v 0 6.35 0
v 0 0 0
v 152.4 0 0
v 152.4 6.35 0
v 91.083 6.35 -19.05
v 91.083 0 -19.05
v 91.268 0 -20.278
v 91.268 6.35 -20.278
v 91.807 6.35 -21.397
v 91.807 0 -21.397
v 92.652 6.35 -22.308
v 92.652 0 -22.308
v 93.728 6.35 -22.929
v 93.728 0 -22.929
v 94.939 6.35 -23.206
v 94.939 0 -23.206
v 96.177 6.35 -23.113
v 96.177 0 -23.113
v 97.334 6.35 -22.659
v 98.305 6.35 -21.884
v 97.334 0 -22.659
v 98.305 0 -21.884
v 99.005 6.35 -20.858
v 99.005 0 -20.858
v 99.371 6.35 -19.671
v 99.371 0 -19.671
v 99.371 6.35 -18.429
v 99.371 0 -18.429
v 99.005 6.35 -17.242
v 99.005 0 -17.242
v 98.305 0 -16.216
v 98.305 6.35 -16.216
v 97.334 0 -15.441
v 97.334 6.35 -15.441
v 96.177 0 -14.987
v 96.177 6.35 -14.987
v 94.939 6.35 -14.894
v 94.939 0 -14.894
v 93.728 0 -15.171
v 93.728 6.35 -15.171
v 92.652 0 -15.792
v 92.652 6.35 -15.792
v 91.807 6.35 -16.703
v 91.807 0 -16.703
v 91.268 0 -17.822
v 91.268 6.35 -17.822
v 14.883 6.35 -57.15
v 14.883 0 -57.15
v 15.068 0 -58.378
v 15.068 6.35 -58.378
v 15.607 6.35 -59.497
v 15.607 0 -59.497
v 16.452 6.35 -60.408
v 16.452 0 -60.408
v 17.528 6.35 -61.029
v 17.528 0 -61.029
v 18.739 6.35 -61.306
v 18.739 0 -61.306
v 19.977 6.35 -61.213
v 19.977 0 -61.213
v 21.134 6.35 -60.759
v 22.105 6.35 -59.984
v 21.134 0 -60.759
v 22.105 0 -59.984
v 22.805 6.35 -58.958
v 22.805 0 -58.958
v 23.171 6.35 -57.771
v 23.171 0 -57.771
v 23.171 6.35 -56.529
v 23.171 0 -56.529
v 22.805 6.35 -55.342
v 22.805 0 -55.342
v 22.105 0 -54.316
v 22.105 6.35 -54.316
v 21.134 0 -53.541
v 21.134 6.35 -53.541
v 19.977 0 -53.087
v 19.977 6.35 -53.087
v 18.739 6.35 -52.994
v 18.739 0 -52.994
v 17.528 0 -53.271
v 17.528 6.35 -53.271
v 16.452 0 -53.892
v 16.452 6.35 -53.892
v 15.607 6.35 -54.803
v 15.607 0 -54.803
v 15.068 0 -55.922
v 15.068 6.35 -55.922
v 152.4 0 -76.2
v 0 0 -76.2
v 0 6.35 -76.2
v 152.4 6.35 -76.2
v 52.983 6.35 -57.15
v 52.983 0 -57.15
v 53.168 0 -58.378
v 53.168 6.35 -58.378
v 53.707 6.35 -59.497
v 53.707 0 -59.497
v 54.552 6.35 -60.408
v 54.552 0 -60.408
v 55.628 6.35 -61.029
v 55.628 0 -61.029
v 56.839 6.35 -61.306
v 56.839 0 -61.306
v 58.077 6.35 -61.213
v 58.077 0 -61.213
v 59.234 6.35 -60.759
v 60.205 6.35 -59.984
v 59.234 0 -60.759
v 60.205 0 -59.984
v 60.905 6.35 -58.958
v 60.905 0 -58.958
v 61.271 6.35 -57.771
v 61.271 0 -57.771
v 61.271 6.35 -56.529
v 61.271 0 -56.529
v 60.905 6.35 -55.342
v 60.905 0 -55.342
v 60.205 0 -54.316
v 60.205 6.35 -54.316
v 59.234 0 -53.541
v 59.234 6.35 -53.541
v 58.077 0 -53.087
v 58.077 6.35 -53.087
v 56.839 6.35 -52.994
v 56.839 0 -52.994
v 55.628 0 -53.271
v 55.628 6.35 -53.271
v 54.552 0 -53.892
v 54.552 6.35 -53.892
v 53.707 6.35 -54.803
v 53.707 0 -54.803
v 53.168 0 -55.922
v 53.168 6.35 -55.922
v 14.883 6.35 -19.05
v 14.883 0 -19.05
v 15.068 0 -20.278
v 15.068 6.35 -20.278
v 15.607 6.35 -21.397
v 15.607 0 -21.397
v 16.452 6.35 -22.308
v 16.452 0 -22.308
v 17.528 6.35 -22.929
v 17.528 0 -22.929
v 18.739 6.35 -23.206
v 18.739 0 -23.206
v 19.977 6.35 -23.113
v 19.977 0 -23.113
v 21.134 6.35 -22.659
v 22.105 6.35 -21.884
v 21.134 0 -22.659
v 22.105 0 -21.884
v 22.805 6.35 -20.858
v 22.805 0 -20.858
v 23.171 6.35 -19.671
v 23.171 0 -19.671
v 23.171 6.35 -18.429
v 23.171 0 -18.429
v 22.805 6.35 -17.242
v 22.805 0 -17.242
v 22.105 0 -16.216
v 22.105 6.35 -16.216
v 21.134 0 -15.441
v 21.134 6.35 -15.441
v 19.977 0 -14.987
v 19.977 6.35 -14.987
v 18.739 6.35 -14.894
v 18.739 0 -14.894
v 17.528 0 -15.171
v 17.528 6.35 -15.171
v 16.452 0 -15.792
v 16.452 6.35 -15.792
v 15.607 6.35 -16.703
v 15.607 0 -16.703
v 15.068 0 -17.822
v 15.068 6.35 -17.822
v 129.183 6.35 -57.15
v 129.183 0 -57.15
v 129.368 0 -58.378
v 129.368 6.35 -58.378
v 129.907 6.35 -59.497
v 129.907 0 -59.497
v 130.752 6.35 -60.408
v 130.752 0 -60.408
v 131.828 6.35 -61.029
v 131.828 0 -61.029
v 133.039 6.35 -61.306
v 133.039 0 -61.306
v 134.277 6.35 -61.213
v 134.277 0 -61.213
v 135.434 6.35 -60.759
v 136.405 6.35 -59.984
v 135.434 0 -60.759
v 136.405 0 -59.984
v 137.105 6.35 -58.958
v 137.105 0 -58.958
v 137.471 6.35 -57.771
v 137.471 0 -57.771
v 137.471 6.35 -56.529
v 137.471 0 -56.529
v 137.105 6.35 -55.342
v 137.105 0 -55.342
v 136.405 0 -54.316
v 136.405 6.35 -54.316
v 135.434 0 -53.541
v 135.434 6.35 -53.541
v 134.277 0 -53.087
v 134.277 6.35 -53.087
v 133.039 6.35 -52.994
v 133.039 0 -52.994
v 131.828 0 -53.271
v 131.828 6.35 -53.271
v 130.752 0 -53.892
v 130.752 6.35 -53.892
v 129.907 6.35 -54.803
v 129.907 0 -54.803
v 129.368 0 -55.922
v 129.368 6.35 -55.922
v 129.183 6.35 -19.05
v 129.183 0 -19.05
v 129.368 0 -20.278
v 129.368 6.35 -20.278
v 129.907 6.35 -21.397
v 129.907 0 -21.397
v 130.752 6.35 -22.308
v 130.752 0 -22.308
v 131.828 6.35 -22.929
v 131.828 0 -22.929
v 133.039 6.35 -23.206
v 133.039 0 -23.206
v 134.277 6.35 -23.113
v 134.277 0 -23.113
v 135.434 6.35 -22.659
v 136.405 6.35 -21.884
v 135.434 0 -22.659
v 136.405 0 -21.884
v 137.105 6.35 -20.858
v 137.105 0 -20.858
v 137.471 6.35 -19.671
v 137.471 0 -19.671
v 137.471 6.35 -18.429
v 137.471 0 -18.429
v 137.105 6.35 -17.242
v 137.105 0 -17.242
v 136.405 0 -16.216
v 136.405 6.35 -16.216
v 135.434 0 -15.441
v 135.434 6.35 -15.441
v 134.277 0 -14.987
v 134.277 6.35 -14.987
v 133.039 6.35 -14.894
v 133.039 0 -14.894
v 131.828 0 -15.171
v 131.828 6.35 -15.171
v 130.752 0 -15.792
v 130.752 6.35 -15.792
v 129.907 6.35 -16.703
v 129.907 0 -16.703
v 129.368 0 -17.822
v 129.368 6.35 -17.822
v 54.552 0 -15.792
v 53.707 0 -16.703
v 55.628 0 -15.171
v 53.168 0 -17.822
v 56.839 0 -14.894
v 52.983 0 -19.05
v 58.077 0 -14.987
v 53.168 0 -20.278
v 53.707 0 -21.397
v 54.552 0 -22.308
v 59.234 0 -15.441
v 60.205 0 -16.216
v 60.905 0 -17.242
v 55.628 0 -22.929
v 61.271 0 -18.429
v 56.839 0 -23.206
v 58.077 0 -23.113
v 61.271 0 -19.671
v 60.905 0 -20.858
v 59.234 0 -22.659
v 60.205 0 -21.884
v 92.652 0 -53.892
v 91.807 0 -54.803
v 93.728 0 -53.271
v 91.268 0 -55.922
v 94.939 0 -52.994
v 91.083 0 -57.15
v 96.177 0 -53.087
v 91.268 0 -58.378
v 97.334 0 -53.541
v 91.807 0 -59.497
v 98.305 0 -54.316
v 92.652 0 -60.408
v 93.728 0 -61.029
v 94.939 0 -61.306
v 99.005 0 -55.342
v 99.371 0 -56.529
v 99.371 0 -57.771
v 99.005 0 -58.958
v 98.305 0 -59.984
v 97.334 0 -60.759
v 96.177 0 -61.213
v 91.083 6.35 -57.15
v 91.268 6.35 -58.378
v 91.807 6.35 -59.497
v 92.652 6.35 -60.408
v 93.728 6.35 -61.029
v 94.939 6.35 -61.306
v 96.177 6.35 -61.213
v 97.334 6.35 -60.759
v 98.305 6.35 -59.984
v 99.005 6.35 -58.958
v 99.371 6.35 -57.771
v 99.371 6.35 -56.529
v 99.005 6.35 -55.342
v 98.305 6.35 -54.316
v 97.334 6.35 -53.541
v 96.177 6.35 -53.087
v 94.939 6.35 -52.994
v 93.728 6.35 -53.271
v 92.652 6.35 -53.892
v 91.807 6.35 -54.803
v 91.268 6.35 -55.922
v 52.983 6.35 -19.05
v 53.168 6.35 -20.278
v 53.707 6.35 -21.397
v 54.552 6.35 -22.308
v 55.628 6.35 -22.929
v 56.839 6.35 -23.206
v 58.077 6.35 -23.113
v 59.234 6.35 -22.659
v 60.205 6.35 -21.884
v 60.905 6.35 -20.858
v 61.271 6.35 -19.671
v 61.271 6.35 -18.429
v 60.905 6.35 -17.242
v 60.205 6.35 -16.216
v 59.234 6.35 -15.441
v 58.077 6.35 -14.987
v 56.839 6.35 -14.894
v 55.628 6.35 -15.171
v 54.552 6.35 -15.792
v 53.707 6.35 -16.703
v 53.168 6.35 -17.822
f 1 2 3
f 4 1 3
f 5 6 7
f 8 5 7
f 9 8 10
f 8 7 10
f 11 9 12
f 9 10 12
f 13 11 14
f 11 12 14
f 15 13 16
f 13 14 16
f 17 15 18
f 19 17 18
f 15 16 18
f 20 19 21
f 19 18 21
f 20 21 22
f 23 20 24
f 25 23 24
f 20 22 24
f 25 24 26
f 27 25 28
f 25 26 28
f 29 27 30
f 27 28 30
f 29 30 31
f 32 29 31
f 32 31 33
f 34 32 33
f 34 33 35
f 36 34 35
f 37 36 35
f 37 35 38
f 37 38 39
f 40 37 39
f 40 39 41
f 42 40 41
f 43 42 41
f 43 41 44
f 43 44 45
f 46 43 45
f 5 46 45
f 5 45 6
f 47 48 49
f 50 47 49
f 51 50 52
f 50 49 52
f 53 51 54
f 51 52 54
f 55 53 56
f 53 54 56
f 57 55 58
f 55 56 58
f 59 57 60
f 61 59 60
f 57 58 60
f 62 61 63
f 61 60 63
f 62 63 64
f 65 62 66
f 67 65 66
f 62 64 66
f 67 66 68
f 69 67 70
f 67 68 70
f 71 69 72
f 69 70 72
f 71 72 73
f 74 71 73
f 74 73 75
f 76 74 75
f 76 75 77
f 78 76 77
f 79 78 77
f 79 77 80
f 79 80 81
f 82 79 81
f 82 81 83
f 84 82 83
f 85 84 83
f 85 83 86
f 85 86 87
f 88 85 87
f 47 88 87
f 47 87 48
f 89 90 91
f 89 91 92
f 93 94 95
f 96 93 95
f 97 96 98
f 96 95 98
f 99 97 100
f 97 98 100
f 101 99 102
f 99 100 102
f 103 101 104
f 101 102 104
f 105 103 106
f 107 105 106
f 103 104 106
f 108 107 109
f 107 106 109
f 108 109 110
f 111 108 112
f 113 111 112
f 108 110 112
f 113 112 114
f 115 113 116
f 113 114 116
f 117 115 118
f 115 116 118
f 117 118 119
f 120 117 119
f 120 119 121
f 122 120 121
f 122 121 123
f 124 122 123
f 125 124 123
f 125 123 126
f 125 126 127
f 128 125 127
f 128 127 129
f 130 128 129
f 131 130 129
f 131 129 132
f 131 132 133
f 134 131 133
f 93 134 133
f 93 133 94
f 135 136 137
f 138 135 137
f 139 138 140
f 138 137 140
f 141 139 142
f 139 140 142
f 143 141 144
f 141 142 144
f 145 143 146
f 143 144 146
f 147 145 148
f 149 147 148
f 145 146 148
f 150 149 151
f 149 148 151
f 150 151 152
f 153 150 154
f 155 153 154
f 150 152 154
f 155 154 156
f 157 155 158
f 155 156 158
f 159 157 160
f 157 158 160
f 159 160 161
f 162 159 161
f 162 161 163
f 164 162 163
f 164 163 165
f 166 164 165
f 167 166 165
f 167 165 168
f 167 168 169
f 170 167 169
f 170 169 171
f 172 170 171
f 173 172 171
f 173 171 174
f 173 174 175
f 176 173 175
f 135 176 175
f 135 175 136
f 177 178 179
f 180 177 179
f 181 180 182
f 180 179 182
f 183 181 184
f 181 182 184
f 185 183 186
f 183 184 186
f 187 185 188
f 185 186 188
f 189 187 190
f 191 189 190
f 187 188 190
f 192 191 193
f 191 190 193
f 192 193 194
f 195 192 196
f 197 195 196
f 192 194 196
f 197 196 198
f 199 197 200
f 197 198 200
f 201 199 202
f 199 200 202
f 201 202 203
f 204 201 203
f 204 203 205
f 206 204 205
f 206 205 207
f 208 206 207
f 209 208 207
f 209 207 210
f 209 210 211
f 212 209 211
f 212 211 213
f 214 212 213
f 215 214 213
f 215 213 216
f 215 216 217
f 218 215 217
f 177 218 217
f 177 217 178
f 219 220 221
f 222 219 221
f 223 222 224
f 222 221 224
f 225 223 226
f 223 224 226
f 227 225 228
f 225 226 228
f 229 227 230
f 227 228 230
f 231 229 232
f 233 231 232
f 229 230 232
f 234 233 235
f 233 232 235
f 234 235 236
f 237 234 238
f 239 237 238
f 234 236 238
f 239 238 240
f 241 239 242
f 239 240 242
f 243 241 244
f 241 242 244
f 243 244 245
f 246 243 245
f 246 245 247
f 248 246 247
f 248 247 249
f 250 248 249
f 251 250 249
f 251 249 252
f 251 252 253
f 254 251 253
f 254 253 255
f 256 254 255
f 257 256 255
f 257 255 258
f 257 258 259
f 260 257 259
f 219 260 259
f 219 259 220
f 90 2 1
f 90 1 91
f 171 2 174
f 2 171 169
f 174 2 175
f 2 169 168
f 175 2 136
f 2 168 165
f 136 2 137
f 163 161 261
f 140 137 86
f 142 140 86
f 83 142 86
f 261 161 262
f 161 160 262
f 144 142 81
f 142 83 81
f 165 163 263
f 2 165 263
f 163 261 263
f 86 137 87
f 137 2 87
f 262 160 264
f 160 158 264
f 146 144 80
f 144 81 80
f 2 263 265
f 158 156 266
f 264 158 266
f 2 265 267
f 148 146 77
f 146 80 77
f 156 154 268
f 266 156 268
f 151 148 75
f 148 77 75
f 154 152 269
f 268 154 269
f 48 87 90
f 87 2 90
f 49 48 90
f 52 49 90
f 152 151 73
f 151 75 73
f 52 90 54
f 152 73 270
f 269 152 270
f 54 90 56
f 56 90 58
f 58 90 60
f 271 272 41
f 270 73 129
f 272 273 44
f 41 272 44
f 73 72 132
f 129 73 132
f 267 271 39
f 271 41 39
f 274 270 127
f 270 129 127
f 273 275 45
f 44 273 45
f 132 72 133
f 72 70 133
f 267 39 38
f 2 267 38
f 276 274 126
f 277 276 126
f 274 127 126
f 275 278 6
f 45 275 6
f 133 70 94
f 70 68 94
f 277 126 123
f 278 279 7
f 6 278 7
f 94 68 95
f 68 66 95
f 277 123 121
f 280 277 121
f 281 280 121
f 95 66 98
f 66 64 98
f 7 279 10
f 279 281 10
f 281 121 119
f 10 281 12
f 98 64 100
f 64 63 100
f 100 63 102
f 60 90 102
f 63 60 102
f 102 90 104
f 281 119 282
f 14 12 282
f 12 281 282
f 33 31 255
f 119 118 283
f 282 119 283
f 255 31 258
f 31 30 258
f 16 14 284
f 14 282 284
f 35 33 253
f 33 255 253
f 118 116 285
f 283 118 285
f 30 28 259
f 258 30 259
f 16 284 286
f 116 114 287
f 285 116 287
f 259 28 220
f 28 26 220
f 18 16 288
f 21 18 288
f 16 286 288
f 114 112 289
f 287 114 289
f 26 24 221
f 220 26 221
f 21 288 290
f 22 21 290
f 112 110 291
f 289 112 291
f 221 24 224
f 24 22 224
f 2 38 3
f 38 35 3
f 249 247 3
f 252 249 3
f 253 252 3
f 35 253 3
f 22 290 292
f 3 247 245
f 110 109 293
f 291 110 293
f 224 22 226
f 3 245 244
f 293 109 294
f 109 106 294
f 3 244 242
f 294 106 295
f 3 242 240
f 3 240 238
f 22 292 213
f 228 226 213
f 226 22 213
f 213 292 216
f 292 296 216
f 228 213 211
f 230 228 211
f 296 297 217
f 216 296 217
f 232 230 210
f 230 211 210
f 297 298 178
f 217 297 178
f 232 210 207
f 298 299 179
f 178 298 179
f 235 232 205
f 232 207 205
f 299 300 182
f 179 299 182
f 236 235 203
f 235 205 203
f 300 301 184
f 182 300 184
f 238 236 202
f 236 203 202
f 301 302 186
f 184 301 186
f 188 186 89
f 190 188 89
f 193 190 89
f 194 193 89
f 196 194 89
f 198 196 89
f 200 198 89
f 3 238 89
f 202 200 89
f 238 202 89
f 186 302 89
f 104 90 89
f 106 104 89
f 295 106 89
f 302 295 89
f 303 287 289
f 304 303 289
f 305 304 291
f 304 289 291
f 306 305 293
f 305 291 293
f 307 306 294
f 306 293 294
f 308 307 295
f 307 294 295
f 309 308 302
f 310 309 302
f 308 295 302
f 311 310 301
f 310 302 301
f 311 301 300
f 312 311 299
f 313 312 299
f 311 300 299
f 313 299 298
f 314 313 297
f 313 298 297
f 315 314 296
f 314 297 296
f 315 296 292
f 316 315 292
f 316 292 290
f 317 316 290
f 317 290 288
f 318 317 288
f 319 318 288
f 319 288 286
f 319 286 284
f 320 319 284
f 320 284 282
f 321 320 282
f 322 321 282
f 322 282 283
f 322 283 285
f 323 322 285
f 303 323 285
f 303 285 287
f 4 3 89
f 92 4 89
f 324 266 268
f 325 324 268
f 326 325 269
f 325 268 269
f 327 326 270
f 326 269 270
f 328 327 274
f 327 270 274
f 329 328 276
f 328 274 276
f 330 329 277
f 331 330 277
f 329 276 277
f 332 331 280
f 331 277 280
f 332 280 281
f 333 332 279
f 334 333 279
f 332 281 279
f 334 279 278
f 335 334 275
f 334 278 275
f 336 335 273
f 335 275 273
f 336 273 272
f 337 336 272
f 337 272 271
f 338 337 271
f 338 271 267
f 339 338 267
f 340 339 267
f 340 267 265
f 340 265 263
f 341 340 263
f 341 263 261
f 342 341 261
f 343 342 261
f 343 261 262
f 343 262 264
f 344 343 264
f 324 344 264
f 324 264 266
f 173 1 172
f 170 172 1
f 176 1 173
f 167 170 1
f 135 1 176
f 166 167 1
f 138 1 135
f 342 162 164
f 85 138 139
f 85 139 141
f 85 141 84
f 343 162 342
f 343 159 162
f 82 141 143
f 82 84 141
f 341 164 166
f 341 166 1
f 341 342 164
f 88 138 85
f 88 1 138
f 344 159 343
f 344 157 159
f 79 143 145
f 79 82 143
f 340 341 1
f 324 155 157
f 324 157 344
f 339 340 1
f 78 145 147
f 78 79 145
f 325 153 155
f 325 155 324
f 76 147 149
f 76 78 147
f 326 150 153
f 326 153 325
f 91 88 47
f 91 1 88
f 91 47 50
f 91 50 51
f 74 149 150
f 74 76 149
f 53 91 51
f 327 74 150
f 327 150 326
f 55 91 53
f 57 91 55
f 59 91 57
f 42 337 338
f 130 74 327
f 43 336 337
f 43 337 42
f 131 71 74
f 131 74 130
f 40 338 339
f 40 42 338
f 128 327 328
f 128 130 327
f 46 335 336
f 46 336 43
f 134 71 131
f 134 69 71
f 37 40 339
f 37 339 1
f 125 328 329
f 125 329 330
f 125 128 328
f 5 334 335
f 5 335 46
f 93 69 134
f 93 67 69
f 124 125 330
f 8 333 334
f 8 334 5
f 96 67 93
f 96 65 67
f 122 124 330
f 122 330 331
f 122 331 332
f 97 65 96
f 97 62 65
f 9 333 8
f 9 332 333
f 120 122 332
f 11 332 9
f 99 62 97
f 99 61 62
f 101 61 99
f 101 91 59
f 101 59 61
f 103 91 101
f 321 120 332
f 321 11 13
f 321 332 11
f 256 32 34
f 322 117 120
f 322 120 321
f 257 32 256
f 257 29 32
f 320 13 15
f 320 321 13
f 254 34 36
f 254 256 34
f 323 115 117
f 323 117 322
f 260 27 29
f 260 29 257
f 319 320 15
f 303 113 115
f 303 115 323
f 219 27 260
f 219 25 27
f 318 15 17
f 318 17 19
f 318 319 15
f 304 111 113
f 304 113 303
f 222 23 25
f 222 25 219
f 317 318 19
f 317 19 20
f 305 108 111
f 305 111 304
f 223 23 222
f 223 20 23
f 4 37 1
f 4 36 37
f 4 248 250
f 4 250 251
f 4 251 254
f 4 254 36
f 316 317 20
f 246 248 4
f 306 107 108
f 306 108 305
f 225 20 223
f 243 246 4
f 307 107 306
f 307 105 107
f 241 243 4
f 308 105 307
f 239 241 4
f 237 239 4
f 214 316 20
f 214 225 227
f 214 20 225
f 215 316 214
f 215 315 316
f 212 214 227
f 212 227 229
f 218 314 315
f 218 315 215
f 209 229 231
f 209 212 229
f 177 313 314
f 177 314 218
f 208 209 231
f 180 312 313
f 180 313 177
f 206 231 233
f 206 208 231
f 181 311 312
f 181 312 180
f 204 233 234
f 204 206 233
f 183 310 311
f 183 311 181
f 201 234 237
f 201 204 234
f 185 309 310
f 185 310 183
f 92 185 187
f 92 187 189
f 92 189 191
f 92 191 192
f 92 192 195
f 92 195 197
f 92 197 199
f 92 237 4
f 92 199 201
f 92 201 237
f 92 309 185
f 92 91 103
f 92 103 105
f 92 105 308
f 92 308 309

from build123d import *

# Parameters (mm, degrees)
SKETCH1_W                        = 152.4
SKETCH1_H                        = 76.2
BOSS_EXTRUDE1_DEPTH              = 6.35
F_21_64_0_32813_DIAMETER_HOLE1_D = 8.334502
LPATTERN1_COUNT                  = 2
LPATTERN1_PITCH                  = 38.1
LPATTERN1_COUNT_DIR2             = 4
LPATTERN1_PITCH_DIR2             = 38.1


with BuildPart() as part:
    # Sketch1 → Boss-Extrude1 (new body)
    with BuildSketch(Plane(origin=(0, 0, 0), x_dir=(1, 0, 0), z_dir=(0, 1, 0))):
        with Locations((76.2, 38.1)):
            Rectangle(SKETCH1_W, SKETCH1_H)
    extrude(amount=BOSS_EXTRUDE1_DEPTH)

    # 21/64 (0.32813) Diameter Hole1 (through all)
    with Locations(Plane(origin=(0, 6.35, 0), x_dir=(1, 0, 0), z_dir=(0, 1, 0))):
        with Locations((19.05, 57.15)):
            f_21_64_0_32813_diameter_hole1 = Hole(F_21_64_0_32813_DIAMETER_HOLE1_D / 2)

    # LPattern1: 21_64 _0.32813_ Diameter Hole1 2 × 4
    with Locations(*[(j * LPATTERN1_PITCH_DIR2, 0, i * LPATTERN1_PITCH) for i in range(LPATTERN1_COUNT) for j in range(LPATTERN1_COUNT_DIR2) if (i, j) != (0, 0)]):
        add(f_21_64_0_32813_diameter_hole1, mode=Mode.SUBTRACT)


solid = part.part
